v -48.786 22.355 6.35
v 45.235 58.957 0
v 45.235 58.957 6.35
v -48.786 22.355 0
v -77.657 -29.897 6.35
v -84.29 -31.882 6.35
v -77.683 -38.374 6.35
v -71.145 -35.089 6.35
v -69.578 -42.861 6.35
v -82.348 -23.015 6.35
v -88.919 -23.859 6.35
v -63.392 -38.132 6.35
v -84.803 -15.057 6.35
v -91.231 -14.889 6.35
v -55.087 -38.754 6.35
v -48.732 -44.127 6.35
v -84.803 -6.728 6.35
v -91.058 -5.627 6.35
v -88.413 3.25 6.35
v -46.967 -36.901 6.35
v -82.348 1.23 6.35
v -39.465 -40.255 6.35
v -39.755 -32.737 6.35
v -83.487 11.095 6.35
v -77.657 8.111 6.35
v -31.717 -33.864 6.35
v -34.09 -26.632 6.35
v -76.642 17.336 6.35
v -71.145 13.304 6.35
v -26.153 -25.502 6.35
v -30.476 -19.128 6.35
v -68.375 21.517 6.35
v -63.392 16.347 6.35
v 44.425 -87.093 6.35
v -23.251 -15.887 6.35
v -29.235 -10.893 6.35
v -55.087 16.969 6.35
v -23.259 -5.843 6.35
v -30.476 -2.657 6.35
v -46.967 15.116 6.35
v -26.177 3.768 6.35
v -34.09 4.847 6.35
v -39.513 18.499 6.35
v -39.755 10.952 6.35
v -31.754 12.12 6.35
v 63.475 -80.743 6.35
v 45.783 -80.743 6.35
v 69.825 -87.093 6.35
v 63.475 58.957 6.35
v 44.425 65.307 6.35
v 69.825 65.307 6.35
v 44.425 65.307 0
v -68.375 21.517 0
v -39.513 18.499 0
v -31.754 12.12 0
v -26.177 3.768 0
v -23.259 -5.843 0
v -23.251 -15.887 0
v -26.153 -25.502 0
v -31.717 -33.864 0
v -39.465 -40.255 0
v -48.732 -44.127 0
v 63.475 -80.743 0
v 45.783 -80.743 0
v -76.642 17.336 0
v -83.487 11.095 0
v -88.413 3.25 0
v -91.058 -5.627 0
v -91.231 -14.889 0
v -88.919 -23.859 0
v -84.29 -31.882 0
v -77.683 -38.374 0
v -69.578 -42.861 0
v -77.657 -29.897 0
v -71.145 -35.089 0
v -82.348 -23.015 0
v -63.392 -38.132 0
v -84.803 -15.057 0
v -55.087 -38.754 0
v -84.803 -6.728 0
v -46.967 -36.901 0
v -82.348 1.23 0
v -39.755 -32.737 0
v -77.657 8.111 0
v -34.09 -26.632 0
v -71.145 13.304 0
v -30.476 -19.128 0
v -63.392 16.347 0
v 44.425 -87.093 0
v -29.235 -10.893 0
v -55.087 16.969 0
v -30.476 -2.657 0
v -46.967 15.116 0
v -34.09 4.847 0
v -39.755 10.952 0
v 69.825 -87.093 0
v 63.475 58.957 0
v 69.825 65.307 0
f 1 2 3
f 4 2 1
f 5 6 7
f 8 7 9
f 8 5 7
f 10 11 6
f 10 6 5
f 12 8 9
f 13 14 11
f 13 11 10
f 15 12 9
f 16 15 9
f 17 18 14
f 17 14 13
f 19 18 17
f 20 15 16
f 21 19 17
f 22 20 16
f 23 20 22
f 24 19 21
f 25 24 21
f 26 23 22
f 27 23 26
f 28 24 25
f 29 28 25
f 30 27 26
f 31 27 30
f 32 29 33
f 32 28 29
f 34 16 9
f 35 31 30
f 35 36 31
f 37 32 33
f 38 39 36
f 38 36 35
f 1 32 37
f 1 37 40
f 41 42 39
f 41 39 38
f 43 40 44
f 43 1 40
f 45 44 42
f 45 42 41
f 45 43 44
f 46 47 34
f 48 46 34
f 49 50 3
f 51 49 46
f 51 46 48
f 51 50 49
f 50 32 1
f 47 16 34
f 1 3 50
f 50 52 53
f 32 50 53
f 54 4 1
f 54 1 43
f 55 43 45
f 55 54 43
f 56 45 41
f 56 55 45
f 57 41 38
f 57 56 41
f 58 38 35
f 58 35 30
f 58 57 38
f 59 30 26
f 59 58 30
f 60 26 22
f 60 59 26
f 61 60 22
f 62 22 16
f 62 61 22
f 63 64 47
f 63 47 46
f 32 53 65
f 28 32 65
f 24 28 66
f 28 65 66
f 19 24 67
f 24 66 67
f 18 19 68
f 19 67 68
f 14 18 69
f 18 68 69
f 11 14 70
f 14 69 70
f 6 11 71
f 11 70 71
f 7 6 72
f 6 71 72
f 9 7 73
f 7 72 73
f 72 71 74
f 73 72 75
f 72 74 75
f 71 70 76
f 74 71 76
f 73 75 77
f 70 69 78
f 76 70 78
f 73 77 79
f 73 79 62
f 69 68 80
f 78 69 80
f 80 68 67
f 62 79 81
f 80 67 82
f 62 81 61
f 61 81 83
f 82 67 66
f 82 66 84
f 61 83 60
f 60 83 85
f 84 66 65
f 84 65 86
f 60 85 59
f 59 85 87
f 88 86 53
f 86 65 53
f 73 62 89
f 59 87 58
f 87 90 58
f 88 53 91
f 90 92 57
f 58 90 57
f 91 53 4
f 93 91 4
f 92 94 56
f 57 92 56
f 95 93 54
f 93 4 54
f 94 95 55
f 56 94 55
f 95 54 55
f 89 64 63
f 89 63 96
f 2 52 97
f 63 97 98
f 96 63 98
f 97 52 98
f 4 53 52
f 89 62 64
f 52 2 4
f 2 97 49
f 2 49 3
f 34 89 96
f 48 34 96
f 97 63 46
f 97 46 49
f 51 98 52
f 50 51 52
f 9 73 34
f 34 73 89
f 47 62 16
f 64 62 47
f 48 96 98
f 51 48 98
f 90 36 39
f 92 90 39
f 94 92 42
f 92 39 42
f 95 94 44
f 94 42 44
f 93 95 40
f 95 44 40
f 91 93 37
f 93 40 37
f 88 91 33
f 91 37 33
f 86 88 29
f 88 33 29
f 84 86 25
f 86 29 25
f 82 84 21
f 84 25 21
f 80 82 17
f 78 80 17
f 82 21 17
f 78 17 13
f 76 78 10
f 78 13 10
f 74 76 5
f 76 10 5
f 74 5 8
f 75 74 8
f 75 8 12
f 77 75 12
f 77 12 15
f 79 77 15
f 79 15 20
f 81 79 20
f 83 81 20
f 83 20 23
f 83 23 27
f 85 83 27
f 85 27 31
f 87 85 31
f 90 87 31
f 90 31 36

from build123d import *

# Parameters (mm, degrees)
F0_W     = 6.35
F0_H     = 6.35
F0_H_2   = 69.85
F1_DEPTH = 6.35
F2_R     = 27.94
F3_DEPTH = 25.4
F5_DEPTH = 25.4


with BuildPart() as f1:
    # F0 (on Top) → F1 (new body)
    with BuildSketch(Plane.XY):
        with Locations((66.649964, 62.1324)):
            Rectangle(F0_W, F0_H)
        with Locations((66.649964, 24.0324)):
            Rectangle(F0_W, F0_H_2)
        with BuildLine():
            Line((63.474964, 58.9574), (63.474964, 65.3074))
            Line((63.474964, 65.3074), (44.424964, 65.3074))
            Line((44.424964, 65.3074), (-68.375352, 21.516612))
            ThreePointArc((-68.375352, 21.516612), (-91.459051, -10.251982), (-69.578284, -42.860765))
            Line((-69.578284, -42.860765), (44.424964, -87.0926))
            Line((44.424964, -87.0926), (63.474964, -87.0926))
            Line((63.474964, -87.0926), (63.474964, -80.7426))
            Line((63.474964, -80.7426), (63.474964, -10.8926))
            Line((63.474964, -10.8926), (63.474964, 58.9574))
        make_face()
        with Locations((66.649964, -45.8176)):
            Rectangle(F0_W, F0_H_2)
        with Locations((66.649964, -83.9176)):
            Rectangle(F0_W, F0_H)
    extrude(amount=F1_DEPTH)

    # F2 (on face) → F3 (cut)
    with BuildSketch(Plane.XY.offset(6.35)):
        with Locations((-57.175036, -10.8926)):
            Circle(F2_R)
    extrude(amount=-F3_DEPTH, mode=Mode.SUBTRACT)

    # F4 (on Top) → F5 (cut)
    with BuildSketch(Plane.XY):
        with BuildLine():
            Line((63.474964, -80.7426), (63.474964, 58.9574))
            Line((63.474964, 58.9574), (45.235226, 58.9574))
            Line((45.235226, 58.9574), (-48.786443, 22.355491))
            ThreePointArc((-48.786443, 22.355491), (-22.885047, -10.86449), (-48.731942, -44.126894))
            Line((-48.731942, -44.126894), (45.783264, -80.7426))
            Line((45.783264, -80.7426), (63.474964, -80.7426))
        make_face()
    extrude(amount=F5_DEPTH, mode=Mode.SUBTRACT)


solid = f1.part
